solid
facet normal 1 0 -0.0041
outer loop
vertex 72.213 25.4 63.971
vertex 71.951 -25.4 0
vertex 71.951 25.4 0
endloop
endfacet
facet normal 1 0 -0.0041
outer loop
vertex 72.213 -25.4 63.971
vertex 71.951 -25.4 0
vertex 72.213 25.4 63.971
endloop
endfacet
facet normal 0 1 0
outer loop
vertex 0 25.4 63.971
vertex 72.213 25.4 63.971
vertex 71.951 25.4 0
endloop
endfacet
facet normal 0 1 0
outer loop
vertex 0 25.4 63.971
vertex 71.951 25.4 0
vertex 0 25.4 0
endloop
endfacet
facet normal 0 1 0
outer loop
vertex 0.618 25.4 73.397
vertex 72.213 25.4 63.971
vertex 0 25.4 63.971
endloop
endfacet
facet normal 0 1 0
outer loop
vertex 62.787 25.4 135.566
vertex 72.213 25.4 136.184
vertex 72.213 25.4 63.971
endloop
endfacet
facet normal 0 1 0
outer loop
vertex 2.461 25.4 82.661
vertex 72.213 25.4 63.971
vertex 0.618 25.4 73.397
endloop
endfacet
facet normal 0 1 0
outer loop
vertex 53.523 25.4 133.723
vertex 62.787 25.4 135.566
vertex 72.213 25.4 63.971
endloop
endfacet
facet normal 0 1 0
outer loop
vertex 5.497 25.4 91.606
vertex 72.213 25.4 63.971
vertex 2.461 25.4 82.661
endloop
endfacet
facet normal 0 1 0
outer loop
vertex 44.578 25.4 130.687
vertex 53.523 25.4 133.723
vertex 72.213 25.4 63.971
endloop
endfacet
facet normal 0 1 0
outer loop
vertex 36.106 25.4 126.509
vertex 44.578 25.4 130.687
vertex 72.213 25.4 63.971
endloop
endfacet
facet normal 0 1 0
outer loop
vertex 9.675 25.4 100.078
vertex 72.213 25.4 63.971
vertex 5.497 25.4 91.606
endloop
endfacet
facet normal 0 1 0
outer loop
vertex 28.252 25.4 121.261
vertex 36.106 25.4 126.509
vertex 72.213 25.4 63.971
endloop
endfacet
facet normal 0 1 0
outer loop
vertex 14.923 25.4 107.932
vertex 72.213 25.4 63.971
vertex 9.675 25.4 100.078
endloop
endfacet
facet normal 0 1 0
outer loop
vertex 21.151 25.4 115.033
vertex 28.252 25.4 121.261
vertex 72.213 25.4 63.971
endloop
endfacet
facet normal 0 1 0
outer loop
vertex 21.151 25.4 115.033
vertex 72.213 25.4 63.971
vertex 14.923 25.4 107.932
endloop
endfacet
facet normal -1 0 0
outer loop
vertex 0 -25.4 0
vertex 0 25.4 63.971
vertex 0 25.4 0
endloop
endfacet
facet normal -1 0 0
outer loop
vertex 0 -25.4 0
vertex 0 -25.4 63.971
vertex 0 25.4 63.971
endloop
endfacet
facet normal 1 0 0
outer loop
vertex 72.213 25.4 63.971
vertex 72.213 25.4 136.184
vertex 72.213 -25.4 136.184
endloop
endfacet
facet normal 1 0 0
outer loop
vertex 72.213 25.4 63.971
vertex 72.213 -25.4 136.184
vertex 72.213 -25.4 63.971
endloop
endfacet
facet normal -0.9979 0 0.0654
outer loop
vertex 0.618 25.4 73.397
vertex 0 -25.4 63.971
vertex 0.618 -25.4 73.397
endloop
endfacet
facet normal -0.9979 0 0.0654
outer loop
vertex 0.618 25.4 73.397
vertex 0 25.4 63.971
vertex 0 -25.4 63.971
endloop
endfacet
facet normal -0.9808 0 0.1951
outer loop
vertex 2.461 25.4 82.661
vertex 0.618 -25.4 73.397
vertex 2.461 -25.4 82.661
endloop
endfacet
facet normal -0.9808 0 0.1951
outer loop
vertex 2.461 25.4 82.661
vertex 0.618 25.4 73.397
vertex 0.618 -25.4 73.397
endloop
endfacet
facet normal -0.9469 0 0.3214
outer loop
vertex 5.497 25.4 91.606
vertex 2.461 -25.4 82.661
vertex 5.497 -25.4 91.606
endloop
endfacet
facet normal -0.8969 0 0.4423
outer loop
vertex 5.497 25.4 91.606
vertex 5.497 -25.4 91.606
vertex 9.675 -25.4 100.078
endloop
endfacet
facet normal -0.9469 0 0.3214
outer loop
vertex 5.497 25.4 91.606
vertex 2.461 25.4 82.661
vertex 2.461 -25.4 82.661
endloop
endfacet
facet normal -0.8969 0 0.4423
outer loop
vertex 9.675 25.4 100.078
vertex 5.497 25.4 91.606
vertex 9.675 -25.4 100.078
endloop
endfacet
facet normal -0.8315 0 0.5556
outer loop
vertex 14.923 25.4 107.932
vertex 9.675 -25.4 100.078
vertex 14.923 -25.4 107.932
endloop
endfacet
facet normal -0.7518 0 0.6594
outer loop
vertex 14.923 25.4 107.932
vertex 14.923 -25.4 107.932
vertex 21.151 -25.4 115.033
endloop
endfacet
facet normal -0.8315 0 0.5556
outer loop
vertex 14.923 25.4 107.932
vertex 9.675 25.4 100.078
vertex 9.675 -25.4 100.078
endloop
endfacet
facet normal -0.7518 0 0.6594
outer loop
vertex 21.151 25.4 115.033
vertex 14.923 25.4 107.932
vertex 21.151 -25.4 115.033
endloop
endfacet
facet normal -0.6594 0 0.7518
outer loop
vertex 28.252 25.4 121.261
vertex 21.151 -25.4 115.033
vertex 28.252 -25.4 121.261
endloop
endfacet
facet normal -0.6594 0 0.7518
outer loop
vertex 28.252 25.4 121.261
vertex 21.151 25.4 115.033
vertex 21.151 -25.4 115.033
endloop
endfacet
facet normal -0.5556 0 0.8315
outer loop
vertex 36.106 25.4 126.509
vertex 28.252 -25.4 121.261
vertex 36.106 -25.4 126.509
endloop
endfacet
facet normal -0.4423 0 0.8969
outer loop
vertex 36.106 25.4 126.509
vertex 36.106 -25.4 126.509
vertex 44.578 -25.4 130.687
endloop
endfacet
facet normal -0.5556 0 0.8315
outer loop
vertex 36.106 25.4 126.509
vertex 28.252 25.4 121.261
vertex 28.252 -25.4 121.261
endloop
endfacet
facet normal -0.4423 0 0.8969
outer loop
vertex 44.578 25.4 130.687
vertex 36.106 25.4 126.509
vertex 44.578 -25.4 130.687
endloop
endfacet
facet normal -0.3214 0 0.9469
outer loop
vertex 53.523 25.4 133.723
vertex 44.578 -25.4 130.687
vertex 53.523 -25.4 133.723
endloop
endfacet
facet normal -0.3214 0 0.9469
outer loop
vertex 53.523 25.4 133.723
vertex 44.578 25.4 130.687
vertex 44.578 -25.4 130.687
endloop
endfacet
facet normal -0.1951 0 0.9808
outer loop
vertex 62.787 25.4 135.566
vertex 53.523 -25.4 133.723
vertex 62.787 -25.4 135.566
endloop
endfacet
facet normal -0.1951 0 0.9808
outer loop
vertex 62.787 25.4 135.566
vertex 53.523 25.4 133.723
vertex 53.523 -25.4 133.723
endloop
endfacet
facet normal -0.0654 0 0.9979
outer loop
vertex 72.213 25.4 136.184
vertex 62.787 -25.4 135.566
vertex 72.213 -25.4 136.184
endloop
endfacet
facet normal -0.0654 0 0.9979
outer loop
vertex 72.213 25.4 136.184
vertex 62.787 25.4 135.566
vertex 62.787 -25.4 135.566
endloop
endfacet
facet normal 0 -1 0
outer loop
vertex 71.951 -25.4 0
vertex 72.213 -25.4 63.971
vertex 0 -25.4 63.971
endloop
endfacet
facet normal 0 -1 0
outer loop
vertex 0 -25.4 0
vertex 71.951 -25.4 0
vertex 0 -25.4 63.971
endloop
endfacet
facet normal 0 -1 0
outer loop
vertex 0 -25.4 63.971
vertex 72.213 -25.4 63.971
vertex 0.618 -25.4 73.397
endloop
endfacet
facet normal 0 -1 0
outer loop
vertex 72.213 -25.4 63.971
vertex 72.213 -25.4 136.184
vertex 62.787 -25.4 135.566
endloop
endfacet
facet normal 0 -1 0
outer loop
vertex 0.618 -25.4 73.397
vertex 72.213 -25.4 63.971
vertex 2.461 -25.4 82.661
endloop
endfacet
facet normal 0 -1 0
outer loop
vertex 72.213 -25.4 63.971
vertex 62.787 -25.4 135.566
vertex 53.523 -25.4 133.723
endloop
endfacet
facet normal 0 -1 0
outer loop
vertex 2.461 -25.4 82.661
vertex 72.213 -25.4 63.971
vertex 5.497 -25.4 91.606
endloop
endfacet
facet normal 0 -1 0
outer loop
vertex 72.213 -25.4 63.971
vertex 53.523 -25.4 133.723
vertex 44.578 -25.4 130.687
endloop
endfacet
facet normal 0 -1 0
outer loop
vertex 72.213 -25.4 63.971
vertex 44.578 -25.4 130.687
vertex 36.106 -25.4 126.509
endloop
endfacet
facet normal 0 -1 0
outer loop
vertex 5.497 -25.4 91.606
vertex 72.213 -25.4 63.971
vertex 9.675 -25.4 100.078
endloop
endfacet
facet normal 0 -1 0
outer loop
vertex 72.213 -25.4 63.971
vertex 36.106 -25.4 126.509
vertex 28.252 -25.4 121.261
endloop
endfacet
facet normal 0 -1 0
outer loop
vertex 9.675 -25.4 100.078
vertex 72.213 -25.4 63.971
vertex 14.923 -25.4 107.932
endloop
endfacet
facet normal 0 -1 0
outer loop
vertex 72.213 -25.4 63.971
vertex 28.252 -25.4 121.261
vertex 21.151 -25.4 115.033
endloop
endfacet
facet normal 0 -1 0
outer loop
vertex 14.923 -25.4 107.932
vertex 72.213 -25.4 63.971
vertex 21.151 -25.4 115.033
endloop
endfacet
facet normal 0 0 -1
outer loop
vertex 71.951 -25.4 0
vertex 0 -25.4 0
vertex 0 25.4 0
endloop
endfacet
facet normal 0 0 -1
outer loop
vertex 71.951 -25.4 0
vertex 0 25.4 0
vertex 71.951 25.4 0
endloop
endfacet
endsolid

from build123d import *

# Parameters (mm, degrees)
F1_DEPTH  = 25.4
F1_FACE_W = 72.2126737237
F1_FACE_H = 50.8
F2_ANGLE  = 90


with BuildPart() as f1:
    # F0 (on Front) → F1 (new body, symmetric)
    with BuildSketch(Plane.XZ):
        Polygon((0, 63.9712512493), (0, 0), (71.9514414668, 0), (72.2126737237, 63.9712512493), align=None)
    extrude(amount=F1_DEPTH, both=True)

    # F1_face (on face) → F2 (revolve)
    with BuildSketch(Plane(origin=(36.1063368618, 0, 63.9712512493), x_dir=(1, 0, 0), z_dir=(0, 0, 1))):
        Rectangle(F1_FACE_W, F1_FACE_H)
    revolve(axis=Axis((72.2126737237, 0, 63.9712512493), (0, 1, 0)), revolution_arc=F2_ANGLE)


solid = f1.part
